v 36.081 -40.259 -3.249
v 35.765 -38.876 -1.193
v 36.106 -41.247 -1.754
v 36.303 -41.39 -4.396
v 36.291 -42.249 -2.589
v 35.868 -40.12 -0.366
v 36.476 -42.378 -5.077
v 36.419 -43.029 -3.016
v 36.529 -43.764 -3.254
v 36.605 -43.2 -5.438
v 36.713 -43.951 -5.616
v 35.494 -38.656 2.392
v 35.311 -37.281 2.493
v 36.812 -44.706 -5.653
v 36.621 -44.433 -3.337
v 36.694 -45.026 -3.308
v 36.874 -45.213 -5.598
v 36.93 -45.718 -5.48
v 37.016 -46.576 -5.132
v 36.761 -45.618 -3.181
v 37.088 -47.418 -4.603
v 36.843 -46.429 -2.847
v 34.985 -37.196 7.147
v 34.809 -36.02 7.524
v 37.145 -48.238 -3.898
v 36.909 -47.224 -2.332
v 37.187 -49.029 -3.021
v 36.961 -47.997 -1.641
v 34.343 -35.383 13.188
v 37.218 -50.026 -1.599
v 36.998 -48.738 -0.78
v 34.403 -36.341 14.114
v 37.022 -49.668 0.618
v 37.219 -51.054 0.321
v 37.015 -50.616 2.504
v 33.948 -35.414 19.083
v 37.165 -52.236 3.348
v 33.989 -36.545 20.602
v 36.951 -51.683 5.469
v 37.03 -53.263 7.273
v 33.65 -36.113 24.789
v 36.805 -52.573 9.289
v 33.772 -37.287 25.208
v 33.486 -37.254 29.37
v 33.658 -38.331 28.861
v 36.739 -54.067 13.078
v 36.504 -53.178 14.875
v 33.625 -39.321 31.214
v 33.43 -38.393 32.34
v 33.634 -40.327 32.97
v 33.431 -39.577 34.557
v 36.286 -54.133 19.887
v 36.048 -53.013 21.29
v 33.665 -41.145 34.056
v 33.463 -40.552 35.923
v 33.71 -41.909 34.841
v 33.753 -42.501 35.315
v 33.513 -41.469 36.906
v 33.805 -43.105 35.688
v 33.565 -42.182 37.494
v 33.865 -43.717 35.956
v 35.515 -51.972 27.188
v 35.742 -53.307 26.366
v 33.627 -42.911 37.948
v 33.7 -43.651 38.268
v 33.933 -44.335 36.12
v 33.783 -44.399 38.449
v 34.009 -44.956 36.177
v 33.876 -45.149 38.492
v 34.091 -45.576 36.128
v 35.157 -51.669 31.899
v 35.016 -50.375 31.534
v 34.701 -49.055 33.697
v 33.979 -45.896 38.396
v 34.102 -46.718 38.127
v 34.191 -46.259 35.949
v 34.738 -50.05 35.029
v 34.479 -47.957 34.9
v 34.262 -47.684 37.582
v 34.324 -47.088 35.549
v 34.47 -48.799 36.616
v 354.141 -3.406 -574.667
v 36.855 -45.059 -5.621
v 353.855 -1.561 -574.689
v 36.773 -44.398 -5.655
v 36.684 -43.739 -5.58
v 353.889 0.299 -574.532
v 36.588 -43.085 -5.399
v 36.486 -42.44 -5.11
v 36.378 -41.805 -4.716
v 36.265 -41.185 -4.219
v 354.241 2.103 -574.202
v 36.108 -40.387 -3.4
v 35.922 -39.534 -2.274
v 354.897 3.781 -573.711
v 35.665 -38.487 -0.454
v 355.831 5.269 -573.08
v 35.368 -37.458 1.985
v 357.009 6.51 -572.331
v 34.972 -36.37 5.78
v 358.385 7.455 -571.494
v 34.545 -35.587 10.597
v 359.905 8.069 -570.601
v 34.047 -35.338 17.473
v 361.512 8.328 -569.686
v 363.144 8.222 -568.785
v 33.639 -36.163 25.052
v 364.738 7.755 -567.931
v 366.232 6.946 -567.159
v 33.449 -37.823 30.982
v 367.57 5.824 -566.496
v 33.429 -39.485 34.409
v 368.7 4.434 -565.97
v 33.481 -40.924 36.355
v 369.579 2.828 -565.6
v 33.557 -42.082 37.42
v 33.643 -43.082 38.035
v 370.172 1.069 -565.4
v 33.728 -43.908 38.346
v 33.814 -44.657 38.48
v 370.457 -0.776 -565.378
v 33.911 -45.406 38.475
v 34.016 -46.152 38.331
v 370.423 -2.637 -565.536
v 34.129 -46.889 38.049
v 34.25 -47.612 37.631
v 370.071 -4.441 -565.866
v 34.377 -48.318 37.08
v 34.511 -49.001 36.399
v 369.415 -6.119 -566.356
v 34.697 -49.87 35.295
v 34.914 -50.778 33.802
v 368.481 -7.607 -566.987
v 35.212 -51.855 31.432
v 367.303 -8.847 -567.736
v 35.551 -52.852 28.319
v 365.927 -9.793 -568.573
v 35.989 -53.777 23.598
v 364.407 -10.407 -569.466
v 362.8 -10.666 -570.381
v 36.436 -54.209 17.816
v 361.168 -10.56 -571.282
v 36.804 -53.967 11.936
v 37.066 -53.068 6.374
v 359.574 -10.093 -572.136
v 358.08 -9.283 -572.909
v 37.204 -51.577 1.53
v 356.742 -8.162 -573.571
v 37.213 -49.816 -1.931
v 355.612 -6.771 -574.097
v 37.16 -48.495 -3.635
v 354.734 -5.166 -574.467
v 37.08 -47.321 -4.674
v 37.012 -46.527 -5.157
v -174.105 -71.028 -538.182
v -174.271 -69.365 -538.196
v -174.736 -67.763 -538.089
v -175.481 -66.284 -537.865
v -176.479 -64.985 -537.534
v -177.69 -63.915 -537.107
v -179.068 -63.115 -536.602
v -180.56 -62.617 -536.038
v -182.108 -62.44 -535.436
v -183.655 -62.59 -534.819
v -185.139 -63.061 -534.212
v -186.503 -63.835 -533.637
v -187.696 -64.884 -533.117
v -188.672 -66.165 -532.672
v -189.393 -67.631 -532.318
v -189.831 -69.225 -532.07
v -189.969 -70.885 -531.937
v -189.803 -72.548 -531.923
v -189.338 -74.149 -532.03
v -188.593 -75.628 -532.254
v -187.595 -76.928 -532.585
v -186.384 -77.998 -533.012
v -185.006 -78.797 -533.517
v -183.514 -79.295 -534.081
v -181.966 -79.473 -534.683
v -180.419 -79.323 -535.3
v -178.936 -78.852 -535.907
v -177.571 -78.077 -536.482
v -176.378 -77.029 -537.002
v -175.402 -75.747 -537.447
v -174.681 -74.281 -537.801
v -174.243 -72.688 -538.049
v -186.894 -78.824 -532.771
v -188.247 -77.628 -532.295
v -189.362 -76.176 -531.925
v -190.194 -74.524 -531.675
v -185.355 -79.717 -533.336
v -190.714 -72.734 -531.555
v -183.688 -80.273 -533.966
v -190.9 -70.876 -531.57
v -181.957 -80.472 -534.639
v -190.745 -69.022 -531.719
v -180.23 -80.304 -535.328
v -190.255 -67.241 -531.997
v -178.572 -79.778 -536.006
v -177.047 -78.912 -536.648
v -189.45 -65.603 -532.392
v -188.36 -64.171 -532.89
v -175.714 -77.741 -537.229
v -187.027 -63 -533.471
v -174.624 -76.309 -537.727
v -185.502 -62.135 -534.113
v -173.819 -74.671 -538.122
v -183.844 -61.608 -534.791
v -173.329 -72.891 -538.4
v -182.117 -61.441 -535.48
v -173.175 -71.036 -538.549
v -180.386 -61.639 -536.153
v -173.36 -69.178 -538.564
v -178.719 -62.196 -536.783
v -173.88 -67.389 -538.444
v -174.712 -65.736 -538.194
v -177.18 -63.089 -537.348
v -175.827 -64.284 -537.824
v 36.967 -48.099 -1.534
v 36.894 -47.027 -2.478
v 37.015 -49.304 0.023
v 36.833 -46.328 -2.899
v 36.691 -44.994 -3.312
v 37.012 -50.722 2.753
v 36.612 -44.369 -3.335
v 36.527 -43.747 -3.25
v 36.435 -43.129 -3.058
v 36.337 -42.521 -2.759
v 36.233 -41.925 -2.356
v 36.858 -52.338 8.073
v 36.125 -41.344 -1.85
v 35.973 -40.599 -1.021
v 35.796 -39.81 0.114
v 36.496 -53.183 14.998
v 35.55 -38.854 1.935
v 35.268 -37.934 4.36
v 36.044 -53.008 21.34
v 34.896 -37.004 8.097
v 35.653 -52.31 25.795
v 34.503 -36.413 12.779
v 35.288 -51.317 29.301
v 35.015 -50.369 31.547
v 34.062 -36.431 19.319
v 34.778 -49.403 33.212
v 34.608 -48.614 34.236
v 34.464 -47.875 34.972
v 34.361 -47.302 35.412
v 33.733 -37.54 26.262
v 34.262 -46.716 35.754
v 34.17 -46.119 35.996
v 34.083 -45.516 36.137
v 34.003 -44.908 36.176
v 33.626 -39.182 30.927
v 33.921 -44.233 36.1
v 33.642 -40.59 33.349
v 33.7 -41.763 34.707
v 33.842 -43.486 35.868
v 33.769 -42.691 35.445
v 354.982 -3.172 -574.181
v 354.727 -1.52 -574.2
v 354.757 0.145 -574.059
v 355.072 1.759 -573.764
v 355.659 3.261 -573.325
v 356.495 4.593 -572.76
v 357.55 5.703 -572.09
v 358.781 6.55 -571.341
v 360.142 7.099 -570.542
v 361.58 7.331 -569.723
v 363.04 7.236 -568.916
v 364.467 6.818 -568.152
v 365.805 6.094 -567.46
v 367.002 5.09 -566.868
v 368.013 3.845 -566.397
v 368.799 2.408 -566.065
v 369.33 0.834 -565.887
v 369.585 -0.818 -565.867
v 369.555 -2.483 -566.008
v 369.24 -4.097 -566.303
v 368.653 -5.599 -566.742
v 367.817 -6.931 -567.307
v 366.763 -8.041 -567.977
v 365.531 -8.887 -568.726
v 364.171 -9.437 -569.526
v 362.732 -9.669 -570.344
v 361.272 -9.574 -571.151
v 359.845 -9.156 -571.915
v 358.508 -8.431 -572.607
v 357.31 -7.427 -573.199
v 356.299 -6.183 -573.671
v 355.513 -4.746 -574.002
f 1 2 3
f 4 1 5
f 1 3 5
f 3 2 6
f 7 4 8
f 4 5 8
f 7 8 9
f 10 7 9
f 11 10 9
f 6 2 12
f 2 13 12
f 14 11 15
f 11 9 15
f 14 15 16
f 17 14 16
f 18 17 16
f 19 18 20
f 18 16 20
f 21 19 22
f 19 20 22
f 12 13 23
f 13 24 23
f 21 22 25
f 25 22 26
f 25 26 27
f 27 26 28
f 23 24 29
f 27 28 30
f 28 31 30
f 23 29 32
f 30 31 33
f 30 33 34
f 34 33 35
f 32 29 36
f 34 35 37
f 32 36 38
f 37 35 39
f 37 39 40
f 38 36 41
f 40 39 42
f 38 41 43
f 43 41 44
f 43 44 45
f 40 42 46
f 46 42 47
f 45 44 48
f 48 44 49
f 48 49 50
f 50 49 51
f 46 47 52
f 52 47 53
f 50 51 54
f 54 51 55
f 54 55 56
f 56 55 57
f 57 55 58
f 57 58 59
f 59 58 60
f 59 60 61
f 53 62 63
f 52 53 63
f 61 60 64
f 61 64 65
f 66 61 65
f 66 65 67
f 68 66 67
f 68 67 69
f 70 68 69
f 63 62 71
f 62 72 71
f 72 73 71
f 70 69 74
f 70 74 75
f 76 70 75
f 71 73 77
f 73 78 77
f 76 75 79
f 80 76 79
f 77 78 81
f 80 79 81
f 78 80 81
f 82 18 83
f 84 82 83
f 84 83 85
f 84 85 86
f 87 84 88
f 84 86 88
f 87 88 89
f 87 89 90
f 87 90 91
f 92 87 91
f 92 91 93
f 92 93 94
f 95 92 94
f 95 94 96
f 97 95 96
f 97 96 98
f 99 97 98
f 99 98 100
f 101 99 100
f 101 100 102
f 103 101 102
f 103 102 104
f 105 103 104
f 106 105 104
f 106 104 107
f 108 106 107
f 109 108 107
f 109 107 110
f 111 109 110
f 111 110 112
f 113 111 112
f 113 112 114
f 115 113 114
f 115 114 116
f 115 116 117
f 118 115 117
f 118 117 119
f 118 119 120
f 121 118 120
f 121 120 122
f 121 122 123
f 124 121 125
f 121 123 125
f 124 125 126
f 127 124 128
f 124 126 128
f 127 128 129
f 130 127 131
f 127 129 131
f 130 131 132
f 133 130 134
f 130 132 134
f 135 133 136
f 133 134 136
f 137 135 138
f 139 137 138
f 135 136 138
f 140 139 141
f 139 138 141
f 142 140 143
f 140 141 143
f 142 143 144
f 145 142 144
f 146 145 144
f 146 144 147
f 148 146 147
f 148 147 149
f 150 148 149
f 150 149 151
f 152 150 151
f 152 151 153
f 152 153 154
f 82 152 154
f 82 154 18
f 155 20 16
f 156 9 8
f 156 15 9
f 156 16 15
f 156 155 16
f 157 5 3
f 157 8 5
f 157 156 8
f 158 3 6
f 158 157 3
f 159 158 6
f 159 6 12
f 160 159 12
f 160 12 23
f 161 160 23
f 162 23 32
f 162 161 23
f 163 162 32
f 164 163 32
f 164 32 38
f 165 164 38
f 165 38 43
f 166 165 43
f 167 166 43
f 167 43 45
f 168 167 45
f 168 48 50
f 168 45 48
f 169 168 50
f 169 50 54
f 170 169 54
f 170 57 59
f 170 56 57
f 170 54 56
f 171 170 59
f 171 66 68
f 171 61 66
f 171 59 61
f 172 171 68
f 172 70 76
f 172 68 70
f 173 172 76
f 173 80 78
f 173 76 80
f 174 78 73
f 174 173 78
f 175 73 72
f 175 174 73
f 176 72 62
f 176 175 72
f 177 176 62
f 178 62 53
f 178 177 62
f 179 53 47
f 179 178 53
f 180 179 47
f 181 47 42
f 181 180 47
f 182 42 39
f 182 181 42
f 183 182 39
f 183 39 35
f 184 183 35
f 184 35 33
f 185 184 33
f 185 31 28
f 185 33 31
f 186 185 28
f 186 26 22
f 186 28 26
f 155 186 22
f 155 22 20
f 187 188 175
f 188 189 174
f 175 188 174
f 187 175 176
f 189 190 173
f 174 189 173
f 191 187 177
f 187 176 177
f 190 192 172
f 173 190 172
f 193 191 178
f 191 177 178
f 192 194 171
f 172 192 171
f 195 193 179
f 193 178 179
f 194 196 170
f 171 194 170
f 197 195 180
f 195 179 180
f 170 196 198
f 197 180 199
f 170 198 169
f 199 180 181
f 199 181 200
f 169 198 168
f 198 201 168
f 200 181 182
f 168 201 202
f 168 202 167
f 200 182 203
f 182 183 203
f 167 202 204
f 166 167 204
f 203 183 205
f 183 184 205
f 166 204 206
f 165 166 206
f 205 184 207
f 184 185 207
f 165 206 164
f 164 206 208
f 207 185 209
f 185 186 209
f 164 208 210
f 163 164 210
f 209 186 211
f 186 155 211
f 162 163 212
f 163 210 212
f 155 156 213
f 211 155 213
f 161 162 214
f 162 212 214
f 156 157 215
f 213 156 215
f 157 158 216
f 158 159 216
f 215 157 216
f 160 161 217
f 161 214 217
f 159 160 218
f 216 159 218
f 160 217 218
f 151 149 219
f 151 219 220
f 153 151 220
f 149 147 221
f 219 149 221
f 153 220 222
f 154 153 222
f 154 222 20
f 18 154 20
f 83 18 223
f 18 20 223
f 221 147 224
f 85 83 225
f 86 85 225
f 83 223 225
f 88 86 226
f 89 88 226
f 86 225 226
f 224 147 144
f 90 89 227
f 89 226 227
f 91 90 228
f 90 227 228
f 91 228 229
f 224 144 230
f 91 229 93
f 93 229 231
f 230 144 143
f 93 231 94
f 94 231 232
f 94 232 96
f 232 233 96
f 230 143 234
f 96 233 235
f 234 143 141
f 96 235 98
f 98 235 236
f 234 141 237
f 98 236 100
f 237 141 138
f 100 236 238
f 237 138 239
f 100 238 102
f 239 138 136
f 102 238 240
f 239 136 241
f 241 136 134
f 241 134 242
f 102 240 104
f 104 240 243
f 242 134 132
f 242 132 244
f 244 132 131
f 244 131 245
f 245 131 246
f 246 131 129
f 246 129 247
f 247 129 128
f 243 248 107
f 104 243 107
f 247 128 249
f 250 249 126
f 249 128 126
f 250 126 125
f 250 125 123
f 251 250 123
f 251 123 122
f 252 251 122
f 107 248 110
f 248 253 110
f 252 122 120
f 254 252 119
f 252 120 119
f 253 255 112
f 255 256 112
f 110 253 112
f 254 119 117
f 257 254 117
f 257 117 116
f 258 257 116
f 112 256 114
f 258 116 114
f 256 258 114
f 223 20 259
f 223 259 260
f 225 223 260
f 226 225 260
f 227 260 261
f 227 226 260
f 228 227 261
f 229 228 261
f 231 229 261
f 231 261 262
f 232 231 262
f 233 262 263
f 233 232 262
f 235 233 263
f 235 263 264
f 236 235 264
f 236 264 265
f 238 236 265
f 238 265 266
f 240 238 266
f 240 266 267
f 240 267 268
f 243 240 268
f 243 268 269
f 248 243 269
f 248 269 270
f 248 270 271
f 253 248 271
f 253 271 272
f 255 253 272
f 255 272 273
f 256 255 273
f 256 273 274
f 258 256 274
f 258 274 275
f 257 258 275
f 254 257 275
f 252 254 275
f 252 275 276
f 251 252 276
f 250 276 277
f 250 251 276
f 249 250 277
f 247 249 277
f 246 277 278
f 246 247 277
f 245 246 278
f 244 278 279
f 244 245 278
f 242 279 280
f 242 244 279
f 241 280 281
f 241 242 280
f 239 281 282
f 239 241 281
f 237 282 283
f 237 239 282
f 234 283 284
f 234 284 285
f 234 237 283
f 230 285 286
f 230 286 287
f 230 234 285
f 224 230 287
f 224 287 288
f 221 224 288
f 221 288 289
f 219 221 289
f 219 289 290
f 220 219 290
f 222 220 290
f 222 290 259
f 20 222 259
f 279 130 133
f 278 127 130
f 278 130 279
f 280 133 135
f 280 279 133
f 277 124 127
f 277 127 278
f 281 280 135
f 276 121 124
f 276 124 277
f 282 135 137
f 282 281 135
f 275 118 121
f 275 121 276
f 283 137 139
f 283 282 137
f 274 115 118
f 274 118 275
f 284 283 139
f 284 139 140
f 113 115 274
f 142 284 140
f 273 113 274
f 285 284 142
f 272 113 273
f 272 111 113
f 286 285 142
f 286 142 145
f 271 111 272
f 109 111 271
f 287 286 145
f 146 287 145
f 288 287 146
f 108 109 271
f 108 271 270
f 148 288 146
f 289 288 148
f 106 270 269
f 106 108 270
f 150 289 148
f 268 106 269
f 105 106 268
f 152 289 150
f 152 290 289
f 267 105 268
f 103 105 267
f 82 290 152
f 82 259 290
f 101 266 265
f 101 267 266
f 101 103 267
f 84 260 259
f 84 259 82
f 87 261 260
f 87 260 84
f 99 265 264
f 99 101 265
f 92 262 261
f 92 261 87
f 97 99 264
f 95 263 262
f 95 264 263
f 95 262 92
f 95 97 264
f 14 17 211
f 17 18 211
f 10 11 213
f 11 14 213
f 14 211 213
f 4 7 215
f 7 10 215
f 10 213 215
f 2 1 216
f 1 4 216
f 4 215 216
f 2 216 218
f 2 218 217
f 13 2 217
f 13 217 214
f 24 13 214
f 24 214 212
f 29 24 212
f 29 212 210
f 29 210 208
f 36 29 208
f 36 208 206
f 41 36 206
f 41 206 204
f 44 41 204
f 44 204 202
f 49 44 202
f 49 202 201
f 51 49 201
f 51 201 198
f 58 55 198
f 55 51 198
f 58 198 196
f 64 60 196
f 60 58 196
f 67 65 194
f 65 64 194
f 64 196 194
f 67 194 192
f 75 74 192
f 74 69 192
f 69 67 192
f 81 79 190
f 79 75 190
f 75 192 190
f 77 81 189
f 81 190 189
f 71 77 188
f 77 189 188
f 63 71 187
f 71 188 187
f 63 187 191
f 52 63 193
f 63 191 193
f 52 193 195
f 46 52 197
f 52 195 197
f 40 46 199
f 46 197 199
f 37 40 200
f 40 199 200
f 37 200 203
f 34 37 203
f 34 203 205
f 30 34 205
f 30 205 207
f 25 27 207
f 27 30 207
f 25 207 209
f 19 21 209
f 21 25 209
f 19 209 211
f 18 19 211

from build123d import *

# Parameters (mm, degrees)
SKETCH1_R                                 = 9.525
SKETCH1_R_2                               = 8.525
PIPE_STANDARD_S40_PIPE_1_SCH_40_1_DEPTH   = 622.589065093
SKETCH1_ON_SEGMENT_2_R                    = 9.525
SKETCH1_ON_SEGMENT_2_R_2                  = 8.525
PIPE_STANDARD_S40_PIPE_1_SCH_40_1_2_DEPTH = 702.032675189


with BuildPart() as part:
    # Sketch1 → Pipe standard s40 PIPE 1 SCH 40(1) (new body)
    with BuildSketch(Plane(origin=(-182.037028919, -70.956246539, -535.059499451), x_dir=(0.9304472685626328, -0.008381115739210878, -0.36632995690129105), z_dir=(0.3663299569012911, 0.044142820908401624, 0.9294373427181346))):
        Circle(SKETCH1_R)
        Circle(SKETCH1_R_2, mode=Mode.SUBTRACT)
    extrude(amount=PIPE_STANDARD_S40_PIPE_1_SCH_40_1_DEPTH)

    # Pipe standard s40 PIPE 1 SCH 40(1) mitre
    split(bisect_by=Plane(origin=(35.323609273, -44.764253383, 16.418997373), x_dir=(0.126815049, -0.99192638, 0), z_dir=(-0.989691413, -0.126529315, -0.067091272)), keep=Keep.TOP)


with BuildPart() as body_2:
    # Sketch1 on segment 2 (carried to segment 2) → Pipe standard s40 PIPE 1 SCH 40_1 2 (new body)
    with BuildSketch(Plane(origin=(21.118015273, -46.659104037, 41.908834566), x_dir=(-0.841531219, -0.234923673, -0.486452542), z_dir=(0.485786645, 0.064797934, -0.871672279))):
        Circle(SKETCH1_ON_SEGMENT_2_R)
        Circle(SKETCH1_ON_SEGMENT_2_R_2, mode=Mode.SUBTRACT)
    extrude(amount=PIPE_STANDARD_S40_PIPE_1_SCH_40_1_2_DEPTH)

    # Pipe standard s40 PIPE 1 SCH 40_1 2 mitr
    split(bisect_by=Plane(origin=(35.323609273, -44.764253383, 16.418997373), x_dir=(-0.126815049, 0.99192638, 0), z_dir=(0.989691413, 0.126529315, 0.067091272)), keep=Keep.TOP)


solid = Compound([part.part, body_2.part])
